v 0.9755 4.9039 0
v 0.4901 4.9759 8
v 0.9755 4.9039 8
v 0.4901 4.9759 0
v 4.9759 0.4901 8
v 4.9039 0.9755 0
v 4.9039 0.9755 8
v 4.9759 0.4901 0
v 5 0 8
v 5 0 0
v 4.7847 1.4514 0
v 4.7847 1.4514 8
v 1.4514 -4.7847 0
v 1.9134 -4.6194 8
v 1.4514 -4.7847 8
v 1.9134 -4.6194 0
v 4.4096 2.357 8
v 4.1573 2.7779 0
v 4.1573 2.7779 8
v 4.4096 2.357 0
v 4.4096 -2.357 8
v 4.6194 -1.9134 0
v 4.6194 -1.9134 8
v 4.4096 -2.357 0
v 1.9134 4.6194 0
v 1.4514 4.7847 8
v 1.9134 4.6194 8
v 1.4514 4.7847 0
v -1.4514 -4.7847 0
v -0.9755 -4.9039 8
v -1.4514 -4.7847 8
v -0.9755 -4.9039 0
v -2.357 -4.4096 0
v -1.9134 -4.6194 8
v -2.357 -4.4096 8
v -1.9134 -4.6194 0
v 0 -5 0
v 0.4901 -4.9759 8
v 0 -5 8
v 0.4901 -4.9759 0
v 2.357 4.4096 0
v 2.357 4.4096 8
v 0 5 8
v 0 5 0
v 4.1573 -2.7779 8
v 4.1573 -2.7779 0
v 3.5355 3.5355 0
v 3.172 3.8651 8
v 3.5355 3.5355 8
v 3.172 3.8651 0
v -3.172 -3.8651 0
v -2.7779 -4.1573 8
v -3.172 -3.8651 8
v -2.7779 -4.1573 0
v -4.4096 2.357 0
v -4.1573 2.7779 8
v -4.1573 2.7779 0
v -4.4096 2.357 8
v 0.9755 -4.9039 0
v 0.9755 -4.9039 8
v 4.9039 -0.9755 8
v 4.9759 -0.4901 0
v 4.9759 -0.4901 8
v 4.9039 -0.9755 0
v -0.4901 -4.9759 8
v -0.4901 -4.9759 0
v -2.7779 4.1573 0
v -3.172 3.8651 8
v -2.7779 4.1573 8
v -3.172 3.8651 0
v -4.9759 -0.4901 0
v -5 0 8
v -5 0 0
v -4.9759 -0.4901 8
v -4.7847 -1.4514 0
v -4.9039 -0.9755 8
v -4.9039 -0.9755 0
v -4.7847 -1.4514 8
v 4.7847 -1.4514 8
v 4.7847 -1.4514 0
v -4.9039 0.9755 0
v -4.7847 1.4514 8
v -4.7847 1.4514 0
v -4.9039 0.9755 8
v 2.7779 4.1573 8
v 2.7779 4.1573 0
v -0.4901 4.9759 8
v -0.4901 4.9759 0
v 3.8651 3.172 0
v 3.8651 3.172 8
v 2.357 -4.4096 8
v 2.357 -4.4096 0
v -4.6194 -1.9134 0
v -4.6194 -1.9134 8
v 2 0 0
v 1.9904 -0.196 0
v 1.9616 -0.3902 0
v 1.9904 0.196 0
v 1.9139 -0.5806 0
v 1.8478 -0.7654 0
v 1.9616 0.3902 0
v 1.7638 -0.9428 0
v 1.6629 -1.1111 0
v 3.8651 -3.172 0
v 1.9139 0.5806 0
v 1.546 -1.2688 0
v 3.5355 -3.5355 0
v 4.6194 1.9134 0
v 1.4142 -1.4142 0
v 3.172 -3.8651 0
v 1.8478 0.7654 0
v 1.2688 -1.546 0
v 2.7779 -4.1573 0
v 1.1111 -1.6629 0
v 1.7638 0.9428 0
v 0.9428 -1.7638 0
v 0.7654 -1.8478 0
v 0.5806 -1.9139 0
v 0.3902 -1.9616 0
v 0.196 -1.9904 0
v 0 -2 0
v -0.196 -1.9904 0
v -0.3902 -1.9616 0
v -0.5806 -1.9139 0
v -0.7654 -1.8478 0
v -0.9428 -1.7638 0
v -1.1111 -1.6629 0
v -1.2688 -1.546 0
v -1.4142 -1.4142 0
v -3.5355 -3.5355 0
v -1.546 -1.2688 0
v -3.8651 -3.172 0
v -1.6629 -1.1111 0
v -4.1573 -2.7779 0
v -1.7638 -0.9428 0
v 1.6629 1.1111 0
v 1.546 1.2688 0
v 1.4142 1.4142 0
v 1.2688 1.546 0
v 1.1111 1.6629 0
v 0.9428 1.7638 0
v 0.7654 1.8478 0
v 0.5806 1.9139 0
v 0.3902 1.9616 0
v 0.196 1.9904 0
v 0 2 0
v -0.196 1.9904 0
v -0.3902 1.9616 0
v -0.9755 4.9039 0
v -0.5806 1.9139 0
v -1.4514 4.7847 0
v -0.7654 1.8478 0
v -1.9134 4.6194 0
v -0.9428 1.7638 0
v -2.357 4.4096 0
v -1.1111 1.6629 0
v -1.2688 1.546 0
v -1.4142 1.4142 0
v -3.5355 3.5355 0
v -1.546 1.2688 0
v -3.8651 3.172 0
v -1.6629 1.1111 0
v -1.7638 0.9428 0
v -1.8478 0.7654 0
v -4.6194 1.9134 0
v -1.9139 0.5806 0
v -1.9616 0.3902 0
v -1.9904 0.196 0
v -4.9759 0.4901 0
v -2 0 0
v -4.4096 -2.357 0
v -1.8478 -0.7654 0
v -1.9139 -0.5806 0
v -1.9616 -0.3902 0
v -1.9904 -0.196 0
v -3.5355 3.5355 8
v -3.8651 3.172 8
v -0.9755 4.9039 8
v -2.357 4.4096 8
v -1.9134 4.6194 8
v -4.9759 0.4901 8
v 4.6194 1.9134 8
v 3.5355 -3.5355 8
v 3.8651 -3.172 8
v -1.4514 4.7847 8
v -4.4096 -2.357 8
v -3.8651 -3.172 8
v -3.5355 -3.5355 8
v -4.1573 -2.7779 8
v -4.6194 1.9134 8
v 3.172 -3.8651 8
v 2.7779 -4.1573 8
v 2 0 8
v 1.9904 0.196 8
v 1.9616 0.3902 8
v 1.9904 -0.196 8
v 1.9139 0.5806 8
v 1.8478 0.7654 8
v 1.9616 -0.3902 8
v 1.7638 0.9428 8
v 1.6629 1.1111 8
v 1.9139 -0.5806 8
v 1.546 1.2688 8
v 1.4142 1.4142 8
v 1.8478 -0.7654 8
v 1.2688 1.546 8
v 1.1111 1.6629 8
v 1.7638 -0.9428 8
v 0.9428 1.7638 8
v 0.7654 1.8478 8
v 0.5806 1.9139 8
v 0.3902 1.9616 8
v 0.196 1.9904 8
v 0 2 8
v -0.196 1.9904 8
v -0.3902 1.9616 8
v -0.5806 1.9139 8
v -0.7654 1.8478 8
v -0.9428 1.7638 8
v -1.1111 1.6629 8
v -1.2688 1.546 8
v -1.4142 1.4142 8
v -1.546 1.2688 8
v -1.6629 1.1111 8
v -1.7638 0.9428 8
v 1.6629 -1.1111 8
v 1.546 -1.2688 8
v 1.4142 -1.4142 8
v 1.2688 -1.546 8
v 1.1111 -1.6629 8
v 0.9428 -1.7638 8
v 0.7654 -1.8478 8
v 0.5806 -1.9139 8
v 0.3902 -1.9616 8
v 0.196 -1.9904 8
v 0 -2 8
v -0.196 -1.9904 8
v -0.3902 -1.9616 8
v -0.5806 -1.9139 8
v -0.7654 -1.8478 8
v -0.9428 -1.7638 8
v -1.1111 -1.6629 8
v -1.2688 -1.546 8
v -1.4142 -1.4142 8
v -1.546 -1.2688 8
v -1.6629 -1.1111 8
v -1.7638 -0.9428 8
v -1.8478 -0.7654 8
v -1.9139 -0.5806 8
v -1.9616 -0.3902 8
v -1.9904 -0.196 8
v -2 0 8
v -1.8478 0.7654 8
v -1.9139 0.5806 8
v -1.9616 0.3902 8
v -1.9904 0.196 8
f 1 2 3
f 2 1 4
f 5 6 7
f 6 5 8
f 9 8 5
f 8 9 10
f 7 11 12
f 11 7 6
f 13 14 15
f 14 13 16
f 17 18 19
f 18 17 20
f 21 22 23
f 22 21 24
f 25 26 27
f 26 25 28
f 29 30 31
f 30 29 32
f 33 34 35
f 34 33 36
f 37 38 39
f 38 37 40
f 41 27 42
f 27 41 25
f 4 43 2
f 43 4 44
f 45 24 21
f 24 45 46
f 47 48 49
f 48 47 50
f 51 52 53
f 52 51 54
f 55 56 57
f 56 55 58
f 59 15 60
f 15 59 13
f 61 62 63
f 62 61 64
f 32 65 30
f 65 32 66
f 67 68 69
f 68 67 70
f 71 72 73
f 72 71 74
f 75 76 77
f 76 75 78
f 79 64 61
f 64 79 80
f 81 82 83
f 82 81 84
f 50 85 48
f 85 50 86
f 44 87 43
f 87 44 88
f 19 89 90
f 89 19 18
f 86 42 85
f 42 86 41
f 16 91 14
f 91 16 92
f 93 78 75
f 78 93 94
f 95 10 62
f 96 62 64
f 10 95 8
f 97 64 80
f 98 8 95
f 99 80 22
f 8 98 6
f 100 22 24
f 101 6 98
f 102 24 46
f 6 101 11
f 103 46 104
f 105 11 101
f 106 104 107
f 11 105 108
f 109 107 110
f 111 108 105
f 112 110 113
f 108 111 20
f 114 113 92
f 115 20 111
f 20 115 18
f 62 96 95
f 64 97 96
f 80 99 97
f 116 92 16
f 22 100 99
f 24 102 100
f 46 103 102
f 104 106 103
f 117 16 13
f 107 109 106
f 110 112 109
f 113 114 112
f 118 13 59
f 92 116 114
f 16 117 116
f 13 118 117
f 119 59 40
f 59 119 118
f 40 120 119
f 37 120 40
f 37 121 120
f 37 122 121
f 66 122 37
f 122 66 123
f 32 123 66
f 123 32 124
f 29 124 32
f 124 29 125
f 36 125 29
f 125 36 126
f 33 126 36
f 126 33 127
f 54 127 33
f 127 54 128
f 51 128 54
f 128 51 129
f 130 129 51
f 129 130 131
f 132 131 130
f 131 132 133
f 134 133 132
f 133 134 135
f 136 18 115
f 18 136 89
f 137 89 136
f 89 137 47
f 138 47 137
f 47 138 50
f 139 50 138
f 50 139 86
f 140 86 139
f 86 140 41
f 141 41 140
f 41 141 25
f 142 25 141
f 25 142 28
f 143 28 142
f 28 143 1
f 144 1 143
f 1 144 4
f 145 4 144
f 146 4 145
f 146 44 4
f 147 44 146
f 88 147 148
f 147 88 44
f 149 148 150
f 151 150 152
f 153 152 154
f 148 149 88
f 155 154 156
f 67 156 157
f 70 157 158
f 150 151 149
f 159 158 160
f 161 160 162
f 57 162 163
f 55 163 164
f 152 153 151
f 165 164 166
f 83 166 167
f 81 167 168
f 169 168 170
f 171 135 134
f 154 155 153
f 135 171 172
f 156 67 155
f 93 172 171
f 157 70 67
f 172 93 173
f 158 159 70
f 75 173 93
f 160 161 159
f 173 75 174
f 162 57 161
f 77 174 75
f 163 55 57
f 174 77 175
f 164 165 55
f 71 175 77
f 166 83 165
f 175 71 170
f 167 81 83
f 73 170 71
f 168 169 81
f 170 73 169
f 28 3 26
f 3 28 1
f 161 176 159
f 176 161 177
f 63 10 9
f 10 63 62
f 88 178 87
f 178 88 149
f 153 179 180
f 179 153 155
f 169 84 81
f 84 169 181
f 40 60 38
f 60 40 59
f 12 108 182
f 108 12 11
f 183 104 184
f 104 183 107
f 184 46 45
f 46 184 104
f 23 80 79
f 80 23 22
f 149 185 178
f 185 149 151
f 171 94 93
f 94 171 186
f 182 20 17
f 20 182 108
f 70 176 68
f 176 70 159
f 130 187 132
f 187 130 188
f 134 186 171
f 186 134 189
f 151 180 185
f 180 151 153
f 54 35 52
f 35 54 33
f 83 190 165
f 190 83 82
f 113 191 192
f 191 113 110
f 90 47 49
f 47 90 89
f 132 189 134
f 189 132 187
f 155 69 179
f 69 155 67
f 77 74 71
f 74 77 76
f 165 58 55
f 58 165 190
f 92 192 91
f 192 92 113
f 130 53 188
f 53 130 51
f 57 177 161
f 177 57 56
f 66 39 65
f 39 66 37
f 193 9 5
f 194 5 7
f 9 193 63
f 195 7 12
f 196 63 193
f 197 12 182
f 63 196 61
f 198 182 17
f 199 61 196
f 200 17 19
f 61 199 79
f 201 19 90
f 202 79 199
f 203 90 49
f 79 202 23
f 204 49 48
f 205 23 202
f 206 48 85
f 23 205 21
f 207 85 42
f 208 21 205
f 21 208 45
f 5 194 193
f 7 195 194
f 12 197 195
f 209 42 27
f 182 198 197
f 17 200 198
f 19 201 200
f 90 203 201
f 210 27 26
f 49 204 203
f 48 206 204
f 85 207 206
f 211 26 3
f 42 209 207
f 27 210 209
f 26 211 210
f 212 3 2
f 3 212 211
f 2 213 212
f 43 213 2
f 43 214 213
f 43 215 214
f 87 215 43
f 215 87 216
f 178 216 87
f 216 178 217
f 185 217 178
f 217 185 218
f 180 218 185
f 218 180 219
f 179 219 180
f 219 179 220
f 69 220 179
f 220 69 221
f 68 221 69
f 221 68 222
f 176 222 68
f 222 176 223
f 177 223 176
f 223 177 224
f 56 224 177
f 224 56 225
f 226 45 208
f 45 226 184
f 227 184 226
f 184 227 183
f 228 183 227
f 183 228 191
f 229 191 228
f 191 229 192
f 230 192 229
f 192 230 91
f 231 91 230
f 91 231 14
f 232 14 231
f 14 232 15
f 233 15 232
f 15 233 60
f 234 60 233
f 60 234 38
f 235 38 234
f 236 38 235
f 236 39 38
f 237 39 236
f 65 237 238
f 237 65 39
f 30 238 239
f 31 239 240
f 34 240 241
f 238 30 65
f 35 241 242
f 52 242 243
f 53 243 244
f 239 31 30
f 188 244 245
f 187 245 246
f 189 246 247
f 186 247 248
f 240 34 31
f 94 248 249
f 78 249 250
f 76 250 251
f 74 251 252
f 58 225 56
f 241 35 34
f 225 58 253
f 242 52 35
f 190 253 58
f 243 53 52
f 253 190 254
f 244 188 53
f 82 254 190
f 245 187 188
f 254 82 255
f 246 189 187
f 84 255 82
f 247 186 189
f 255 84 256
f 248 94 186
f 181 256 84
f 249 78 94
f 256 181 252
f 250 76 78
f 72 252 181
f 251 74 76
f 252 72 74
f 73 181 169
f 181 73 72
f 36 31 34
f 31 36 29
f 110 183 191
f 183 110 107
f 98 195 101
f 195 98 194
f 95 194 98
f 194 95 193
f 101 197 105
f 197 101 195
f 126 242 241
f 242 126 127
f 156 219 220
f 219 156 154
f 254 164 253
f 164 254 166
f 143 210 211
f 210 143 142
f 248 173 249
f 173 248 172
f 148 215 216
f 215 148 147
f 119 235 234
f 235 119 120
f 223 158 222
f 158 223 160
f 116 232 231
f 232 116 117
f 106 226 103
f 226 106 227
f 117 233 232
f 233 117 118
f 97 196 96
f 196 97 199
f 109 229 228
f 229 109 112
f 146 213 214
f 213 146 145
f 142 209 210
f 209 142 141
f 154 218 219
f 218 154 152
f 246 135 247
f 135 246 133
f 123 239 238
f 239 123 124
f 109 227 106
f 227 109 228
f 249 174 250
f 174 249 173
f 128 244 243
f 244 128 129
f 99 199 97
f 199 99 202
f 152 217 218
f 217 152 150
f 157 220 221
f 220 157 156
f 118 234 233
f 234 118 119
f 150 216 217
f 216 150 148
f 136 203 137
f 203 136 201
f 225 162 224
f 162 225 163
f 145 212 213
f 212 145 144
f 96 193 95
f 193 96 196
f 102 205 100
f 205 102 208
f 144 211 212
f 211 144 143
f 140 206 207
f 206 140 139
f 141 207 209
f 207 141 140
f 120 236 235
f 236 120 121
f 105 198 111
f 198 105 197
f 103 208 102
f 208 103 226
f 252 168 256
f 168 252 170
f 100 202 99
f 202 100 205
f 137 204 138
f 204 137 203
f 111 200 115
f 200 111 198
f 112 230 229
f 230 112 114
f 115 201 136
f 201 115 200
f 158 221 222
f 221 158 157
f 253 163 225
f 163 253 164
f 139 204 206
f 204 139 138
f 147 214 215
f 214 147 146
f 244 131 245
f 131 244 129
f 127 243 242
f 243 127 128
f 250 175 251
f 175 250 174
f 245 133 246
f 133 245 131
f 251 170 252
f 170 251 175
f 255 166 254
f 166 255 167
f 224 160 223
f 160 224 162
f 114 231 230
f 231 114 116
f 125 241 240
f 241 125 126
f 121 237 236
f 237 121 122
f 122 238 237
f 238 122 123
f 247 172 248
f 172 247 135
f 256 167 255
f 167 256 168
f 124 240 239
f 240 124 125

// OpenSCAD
module threaded_heat_set_insert() {
    difference() {
        // Outer cylinder
        cylinder(h=8.0, d=10.0, $fn=64);
        
        // Inner thread space for 4.0mm screws
        translate([0, 0, -1]) {
            cylinder(h=10.0, d=4.0, $fn=64);
        }
    }
}

threaded_heat_set_insert();
